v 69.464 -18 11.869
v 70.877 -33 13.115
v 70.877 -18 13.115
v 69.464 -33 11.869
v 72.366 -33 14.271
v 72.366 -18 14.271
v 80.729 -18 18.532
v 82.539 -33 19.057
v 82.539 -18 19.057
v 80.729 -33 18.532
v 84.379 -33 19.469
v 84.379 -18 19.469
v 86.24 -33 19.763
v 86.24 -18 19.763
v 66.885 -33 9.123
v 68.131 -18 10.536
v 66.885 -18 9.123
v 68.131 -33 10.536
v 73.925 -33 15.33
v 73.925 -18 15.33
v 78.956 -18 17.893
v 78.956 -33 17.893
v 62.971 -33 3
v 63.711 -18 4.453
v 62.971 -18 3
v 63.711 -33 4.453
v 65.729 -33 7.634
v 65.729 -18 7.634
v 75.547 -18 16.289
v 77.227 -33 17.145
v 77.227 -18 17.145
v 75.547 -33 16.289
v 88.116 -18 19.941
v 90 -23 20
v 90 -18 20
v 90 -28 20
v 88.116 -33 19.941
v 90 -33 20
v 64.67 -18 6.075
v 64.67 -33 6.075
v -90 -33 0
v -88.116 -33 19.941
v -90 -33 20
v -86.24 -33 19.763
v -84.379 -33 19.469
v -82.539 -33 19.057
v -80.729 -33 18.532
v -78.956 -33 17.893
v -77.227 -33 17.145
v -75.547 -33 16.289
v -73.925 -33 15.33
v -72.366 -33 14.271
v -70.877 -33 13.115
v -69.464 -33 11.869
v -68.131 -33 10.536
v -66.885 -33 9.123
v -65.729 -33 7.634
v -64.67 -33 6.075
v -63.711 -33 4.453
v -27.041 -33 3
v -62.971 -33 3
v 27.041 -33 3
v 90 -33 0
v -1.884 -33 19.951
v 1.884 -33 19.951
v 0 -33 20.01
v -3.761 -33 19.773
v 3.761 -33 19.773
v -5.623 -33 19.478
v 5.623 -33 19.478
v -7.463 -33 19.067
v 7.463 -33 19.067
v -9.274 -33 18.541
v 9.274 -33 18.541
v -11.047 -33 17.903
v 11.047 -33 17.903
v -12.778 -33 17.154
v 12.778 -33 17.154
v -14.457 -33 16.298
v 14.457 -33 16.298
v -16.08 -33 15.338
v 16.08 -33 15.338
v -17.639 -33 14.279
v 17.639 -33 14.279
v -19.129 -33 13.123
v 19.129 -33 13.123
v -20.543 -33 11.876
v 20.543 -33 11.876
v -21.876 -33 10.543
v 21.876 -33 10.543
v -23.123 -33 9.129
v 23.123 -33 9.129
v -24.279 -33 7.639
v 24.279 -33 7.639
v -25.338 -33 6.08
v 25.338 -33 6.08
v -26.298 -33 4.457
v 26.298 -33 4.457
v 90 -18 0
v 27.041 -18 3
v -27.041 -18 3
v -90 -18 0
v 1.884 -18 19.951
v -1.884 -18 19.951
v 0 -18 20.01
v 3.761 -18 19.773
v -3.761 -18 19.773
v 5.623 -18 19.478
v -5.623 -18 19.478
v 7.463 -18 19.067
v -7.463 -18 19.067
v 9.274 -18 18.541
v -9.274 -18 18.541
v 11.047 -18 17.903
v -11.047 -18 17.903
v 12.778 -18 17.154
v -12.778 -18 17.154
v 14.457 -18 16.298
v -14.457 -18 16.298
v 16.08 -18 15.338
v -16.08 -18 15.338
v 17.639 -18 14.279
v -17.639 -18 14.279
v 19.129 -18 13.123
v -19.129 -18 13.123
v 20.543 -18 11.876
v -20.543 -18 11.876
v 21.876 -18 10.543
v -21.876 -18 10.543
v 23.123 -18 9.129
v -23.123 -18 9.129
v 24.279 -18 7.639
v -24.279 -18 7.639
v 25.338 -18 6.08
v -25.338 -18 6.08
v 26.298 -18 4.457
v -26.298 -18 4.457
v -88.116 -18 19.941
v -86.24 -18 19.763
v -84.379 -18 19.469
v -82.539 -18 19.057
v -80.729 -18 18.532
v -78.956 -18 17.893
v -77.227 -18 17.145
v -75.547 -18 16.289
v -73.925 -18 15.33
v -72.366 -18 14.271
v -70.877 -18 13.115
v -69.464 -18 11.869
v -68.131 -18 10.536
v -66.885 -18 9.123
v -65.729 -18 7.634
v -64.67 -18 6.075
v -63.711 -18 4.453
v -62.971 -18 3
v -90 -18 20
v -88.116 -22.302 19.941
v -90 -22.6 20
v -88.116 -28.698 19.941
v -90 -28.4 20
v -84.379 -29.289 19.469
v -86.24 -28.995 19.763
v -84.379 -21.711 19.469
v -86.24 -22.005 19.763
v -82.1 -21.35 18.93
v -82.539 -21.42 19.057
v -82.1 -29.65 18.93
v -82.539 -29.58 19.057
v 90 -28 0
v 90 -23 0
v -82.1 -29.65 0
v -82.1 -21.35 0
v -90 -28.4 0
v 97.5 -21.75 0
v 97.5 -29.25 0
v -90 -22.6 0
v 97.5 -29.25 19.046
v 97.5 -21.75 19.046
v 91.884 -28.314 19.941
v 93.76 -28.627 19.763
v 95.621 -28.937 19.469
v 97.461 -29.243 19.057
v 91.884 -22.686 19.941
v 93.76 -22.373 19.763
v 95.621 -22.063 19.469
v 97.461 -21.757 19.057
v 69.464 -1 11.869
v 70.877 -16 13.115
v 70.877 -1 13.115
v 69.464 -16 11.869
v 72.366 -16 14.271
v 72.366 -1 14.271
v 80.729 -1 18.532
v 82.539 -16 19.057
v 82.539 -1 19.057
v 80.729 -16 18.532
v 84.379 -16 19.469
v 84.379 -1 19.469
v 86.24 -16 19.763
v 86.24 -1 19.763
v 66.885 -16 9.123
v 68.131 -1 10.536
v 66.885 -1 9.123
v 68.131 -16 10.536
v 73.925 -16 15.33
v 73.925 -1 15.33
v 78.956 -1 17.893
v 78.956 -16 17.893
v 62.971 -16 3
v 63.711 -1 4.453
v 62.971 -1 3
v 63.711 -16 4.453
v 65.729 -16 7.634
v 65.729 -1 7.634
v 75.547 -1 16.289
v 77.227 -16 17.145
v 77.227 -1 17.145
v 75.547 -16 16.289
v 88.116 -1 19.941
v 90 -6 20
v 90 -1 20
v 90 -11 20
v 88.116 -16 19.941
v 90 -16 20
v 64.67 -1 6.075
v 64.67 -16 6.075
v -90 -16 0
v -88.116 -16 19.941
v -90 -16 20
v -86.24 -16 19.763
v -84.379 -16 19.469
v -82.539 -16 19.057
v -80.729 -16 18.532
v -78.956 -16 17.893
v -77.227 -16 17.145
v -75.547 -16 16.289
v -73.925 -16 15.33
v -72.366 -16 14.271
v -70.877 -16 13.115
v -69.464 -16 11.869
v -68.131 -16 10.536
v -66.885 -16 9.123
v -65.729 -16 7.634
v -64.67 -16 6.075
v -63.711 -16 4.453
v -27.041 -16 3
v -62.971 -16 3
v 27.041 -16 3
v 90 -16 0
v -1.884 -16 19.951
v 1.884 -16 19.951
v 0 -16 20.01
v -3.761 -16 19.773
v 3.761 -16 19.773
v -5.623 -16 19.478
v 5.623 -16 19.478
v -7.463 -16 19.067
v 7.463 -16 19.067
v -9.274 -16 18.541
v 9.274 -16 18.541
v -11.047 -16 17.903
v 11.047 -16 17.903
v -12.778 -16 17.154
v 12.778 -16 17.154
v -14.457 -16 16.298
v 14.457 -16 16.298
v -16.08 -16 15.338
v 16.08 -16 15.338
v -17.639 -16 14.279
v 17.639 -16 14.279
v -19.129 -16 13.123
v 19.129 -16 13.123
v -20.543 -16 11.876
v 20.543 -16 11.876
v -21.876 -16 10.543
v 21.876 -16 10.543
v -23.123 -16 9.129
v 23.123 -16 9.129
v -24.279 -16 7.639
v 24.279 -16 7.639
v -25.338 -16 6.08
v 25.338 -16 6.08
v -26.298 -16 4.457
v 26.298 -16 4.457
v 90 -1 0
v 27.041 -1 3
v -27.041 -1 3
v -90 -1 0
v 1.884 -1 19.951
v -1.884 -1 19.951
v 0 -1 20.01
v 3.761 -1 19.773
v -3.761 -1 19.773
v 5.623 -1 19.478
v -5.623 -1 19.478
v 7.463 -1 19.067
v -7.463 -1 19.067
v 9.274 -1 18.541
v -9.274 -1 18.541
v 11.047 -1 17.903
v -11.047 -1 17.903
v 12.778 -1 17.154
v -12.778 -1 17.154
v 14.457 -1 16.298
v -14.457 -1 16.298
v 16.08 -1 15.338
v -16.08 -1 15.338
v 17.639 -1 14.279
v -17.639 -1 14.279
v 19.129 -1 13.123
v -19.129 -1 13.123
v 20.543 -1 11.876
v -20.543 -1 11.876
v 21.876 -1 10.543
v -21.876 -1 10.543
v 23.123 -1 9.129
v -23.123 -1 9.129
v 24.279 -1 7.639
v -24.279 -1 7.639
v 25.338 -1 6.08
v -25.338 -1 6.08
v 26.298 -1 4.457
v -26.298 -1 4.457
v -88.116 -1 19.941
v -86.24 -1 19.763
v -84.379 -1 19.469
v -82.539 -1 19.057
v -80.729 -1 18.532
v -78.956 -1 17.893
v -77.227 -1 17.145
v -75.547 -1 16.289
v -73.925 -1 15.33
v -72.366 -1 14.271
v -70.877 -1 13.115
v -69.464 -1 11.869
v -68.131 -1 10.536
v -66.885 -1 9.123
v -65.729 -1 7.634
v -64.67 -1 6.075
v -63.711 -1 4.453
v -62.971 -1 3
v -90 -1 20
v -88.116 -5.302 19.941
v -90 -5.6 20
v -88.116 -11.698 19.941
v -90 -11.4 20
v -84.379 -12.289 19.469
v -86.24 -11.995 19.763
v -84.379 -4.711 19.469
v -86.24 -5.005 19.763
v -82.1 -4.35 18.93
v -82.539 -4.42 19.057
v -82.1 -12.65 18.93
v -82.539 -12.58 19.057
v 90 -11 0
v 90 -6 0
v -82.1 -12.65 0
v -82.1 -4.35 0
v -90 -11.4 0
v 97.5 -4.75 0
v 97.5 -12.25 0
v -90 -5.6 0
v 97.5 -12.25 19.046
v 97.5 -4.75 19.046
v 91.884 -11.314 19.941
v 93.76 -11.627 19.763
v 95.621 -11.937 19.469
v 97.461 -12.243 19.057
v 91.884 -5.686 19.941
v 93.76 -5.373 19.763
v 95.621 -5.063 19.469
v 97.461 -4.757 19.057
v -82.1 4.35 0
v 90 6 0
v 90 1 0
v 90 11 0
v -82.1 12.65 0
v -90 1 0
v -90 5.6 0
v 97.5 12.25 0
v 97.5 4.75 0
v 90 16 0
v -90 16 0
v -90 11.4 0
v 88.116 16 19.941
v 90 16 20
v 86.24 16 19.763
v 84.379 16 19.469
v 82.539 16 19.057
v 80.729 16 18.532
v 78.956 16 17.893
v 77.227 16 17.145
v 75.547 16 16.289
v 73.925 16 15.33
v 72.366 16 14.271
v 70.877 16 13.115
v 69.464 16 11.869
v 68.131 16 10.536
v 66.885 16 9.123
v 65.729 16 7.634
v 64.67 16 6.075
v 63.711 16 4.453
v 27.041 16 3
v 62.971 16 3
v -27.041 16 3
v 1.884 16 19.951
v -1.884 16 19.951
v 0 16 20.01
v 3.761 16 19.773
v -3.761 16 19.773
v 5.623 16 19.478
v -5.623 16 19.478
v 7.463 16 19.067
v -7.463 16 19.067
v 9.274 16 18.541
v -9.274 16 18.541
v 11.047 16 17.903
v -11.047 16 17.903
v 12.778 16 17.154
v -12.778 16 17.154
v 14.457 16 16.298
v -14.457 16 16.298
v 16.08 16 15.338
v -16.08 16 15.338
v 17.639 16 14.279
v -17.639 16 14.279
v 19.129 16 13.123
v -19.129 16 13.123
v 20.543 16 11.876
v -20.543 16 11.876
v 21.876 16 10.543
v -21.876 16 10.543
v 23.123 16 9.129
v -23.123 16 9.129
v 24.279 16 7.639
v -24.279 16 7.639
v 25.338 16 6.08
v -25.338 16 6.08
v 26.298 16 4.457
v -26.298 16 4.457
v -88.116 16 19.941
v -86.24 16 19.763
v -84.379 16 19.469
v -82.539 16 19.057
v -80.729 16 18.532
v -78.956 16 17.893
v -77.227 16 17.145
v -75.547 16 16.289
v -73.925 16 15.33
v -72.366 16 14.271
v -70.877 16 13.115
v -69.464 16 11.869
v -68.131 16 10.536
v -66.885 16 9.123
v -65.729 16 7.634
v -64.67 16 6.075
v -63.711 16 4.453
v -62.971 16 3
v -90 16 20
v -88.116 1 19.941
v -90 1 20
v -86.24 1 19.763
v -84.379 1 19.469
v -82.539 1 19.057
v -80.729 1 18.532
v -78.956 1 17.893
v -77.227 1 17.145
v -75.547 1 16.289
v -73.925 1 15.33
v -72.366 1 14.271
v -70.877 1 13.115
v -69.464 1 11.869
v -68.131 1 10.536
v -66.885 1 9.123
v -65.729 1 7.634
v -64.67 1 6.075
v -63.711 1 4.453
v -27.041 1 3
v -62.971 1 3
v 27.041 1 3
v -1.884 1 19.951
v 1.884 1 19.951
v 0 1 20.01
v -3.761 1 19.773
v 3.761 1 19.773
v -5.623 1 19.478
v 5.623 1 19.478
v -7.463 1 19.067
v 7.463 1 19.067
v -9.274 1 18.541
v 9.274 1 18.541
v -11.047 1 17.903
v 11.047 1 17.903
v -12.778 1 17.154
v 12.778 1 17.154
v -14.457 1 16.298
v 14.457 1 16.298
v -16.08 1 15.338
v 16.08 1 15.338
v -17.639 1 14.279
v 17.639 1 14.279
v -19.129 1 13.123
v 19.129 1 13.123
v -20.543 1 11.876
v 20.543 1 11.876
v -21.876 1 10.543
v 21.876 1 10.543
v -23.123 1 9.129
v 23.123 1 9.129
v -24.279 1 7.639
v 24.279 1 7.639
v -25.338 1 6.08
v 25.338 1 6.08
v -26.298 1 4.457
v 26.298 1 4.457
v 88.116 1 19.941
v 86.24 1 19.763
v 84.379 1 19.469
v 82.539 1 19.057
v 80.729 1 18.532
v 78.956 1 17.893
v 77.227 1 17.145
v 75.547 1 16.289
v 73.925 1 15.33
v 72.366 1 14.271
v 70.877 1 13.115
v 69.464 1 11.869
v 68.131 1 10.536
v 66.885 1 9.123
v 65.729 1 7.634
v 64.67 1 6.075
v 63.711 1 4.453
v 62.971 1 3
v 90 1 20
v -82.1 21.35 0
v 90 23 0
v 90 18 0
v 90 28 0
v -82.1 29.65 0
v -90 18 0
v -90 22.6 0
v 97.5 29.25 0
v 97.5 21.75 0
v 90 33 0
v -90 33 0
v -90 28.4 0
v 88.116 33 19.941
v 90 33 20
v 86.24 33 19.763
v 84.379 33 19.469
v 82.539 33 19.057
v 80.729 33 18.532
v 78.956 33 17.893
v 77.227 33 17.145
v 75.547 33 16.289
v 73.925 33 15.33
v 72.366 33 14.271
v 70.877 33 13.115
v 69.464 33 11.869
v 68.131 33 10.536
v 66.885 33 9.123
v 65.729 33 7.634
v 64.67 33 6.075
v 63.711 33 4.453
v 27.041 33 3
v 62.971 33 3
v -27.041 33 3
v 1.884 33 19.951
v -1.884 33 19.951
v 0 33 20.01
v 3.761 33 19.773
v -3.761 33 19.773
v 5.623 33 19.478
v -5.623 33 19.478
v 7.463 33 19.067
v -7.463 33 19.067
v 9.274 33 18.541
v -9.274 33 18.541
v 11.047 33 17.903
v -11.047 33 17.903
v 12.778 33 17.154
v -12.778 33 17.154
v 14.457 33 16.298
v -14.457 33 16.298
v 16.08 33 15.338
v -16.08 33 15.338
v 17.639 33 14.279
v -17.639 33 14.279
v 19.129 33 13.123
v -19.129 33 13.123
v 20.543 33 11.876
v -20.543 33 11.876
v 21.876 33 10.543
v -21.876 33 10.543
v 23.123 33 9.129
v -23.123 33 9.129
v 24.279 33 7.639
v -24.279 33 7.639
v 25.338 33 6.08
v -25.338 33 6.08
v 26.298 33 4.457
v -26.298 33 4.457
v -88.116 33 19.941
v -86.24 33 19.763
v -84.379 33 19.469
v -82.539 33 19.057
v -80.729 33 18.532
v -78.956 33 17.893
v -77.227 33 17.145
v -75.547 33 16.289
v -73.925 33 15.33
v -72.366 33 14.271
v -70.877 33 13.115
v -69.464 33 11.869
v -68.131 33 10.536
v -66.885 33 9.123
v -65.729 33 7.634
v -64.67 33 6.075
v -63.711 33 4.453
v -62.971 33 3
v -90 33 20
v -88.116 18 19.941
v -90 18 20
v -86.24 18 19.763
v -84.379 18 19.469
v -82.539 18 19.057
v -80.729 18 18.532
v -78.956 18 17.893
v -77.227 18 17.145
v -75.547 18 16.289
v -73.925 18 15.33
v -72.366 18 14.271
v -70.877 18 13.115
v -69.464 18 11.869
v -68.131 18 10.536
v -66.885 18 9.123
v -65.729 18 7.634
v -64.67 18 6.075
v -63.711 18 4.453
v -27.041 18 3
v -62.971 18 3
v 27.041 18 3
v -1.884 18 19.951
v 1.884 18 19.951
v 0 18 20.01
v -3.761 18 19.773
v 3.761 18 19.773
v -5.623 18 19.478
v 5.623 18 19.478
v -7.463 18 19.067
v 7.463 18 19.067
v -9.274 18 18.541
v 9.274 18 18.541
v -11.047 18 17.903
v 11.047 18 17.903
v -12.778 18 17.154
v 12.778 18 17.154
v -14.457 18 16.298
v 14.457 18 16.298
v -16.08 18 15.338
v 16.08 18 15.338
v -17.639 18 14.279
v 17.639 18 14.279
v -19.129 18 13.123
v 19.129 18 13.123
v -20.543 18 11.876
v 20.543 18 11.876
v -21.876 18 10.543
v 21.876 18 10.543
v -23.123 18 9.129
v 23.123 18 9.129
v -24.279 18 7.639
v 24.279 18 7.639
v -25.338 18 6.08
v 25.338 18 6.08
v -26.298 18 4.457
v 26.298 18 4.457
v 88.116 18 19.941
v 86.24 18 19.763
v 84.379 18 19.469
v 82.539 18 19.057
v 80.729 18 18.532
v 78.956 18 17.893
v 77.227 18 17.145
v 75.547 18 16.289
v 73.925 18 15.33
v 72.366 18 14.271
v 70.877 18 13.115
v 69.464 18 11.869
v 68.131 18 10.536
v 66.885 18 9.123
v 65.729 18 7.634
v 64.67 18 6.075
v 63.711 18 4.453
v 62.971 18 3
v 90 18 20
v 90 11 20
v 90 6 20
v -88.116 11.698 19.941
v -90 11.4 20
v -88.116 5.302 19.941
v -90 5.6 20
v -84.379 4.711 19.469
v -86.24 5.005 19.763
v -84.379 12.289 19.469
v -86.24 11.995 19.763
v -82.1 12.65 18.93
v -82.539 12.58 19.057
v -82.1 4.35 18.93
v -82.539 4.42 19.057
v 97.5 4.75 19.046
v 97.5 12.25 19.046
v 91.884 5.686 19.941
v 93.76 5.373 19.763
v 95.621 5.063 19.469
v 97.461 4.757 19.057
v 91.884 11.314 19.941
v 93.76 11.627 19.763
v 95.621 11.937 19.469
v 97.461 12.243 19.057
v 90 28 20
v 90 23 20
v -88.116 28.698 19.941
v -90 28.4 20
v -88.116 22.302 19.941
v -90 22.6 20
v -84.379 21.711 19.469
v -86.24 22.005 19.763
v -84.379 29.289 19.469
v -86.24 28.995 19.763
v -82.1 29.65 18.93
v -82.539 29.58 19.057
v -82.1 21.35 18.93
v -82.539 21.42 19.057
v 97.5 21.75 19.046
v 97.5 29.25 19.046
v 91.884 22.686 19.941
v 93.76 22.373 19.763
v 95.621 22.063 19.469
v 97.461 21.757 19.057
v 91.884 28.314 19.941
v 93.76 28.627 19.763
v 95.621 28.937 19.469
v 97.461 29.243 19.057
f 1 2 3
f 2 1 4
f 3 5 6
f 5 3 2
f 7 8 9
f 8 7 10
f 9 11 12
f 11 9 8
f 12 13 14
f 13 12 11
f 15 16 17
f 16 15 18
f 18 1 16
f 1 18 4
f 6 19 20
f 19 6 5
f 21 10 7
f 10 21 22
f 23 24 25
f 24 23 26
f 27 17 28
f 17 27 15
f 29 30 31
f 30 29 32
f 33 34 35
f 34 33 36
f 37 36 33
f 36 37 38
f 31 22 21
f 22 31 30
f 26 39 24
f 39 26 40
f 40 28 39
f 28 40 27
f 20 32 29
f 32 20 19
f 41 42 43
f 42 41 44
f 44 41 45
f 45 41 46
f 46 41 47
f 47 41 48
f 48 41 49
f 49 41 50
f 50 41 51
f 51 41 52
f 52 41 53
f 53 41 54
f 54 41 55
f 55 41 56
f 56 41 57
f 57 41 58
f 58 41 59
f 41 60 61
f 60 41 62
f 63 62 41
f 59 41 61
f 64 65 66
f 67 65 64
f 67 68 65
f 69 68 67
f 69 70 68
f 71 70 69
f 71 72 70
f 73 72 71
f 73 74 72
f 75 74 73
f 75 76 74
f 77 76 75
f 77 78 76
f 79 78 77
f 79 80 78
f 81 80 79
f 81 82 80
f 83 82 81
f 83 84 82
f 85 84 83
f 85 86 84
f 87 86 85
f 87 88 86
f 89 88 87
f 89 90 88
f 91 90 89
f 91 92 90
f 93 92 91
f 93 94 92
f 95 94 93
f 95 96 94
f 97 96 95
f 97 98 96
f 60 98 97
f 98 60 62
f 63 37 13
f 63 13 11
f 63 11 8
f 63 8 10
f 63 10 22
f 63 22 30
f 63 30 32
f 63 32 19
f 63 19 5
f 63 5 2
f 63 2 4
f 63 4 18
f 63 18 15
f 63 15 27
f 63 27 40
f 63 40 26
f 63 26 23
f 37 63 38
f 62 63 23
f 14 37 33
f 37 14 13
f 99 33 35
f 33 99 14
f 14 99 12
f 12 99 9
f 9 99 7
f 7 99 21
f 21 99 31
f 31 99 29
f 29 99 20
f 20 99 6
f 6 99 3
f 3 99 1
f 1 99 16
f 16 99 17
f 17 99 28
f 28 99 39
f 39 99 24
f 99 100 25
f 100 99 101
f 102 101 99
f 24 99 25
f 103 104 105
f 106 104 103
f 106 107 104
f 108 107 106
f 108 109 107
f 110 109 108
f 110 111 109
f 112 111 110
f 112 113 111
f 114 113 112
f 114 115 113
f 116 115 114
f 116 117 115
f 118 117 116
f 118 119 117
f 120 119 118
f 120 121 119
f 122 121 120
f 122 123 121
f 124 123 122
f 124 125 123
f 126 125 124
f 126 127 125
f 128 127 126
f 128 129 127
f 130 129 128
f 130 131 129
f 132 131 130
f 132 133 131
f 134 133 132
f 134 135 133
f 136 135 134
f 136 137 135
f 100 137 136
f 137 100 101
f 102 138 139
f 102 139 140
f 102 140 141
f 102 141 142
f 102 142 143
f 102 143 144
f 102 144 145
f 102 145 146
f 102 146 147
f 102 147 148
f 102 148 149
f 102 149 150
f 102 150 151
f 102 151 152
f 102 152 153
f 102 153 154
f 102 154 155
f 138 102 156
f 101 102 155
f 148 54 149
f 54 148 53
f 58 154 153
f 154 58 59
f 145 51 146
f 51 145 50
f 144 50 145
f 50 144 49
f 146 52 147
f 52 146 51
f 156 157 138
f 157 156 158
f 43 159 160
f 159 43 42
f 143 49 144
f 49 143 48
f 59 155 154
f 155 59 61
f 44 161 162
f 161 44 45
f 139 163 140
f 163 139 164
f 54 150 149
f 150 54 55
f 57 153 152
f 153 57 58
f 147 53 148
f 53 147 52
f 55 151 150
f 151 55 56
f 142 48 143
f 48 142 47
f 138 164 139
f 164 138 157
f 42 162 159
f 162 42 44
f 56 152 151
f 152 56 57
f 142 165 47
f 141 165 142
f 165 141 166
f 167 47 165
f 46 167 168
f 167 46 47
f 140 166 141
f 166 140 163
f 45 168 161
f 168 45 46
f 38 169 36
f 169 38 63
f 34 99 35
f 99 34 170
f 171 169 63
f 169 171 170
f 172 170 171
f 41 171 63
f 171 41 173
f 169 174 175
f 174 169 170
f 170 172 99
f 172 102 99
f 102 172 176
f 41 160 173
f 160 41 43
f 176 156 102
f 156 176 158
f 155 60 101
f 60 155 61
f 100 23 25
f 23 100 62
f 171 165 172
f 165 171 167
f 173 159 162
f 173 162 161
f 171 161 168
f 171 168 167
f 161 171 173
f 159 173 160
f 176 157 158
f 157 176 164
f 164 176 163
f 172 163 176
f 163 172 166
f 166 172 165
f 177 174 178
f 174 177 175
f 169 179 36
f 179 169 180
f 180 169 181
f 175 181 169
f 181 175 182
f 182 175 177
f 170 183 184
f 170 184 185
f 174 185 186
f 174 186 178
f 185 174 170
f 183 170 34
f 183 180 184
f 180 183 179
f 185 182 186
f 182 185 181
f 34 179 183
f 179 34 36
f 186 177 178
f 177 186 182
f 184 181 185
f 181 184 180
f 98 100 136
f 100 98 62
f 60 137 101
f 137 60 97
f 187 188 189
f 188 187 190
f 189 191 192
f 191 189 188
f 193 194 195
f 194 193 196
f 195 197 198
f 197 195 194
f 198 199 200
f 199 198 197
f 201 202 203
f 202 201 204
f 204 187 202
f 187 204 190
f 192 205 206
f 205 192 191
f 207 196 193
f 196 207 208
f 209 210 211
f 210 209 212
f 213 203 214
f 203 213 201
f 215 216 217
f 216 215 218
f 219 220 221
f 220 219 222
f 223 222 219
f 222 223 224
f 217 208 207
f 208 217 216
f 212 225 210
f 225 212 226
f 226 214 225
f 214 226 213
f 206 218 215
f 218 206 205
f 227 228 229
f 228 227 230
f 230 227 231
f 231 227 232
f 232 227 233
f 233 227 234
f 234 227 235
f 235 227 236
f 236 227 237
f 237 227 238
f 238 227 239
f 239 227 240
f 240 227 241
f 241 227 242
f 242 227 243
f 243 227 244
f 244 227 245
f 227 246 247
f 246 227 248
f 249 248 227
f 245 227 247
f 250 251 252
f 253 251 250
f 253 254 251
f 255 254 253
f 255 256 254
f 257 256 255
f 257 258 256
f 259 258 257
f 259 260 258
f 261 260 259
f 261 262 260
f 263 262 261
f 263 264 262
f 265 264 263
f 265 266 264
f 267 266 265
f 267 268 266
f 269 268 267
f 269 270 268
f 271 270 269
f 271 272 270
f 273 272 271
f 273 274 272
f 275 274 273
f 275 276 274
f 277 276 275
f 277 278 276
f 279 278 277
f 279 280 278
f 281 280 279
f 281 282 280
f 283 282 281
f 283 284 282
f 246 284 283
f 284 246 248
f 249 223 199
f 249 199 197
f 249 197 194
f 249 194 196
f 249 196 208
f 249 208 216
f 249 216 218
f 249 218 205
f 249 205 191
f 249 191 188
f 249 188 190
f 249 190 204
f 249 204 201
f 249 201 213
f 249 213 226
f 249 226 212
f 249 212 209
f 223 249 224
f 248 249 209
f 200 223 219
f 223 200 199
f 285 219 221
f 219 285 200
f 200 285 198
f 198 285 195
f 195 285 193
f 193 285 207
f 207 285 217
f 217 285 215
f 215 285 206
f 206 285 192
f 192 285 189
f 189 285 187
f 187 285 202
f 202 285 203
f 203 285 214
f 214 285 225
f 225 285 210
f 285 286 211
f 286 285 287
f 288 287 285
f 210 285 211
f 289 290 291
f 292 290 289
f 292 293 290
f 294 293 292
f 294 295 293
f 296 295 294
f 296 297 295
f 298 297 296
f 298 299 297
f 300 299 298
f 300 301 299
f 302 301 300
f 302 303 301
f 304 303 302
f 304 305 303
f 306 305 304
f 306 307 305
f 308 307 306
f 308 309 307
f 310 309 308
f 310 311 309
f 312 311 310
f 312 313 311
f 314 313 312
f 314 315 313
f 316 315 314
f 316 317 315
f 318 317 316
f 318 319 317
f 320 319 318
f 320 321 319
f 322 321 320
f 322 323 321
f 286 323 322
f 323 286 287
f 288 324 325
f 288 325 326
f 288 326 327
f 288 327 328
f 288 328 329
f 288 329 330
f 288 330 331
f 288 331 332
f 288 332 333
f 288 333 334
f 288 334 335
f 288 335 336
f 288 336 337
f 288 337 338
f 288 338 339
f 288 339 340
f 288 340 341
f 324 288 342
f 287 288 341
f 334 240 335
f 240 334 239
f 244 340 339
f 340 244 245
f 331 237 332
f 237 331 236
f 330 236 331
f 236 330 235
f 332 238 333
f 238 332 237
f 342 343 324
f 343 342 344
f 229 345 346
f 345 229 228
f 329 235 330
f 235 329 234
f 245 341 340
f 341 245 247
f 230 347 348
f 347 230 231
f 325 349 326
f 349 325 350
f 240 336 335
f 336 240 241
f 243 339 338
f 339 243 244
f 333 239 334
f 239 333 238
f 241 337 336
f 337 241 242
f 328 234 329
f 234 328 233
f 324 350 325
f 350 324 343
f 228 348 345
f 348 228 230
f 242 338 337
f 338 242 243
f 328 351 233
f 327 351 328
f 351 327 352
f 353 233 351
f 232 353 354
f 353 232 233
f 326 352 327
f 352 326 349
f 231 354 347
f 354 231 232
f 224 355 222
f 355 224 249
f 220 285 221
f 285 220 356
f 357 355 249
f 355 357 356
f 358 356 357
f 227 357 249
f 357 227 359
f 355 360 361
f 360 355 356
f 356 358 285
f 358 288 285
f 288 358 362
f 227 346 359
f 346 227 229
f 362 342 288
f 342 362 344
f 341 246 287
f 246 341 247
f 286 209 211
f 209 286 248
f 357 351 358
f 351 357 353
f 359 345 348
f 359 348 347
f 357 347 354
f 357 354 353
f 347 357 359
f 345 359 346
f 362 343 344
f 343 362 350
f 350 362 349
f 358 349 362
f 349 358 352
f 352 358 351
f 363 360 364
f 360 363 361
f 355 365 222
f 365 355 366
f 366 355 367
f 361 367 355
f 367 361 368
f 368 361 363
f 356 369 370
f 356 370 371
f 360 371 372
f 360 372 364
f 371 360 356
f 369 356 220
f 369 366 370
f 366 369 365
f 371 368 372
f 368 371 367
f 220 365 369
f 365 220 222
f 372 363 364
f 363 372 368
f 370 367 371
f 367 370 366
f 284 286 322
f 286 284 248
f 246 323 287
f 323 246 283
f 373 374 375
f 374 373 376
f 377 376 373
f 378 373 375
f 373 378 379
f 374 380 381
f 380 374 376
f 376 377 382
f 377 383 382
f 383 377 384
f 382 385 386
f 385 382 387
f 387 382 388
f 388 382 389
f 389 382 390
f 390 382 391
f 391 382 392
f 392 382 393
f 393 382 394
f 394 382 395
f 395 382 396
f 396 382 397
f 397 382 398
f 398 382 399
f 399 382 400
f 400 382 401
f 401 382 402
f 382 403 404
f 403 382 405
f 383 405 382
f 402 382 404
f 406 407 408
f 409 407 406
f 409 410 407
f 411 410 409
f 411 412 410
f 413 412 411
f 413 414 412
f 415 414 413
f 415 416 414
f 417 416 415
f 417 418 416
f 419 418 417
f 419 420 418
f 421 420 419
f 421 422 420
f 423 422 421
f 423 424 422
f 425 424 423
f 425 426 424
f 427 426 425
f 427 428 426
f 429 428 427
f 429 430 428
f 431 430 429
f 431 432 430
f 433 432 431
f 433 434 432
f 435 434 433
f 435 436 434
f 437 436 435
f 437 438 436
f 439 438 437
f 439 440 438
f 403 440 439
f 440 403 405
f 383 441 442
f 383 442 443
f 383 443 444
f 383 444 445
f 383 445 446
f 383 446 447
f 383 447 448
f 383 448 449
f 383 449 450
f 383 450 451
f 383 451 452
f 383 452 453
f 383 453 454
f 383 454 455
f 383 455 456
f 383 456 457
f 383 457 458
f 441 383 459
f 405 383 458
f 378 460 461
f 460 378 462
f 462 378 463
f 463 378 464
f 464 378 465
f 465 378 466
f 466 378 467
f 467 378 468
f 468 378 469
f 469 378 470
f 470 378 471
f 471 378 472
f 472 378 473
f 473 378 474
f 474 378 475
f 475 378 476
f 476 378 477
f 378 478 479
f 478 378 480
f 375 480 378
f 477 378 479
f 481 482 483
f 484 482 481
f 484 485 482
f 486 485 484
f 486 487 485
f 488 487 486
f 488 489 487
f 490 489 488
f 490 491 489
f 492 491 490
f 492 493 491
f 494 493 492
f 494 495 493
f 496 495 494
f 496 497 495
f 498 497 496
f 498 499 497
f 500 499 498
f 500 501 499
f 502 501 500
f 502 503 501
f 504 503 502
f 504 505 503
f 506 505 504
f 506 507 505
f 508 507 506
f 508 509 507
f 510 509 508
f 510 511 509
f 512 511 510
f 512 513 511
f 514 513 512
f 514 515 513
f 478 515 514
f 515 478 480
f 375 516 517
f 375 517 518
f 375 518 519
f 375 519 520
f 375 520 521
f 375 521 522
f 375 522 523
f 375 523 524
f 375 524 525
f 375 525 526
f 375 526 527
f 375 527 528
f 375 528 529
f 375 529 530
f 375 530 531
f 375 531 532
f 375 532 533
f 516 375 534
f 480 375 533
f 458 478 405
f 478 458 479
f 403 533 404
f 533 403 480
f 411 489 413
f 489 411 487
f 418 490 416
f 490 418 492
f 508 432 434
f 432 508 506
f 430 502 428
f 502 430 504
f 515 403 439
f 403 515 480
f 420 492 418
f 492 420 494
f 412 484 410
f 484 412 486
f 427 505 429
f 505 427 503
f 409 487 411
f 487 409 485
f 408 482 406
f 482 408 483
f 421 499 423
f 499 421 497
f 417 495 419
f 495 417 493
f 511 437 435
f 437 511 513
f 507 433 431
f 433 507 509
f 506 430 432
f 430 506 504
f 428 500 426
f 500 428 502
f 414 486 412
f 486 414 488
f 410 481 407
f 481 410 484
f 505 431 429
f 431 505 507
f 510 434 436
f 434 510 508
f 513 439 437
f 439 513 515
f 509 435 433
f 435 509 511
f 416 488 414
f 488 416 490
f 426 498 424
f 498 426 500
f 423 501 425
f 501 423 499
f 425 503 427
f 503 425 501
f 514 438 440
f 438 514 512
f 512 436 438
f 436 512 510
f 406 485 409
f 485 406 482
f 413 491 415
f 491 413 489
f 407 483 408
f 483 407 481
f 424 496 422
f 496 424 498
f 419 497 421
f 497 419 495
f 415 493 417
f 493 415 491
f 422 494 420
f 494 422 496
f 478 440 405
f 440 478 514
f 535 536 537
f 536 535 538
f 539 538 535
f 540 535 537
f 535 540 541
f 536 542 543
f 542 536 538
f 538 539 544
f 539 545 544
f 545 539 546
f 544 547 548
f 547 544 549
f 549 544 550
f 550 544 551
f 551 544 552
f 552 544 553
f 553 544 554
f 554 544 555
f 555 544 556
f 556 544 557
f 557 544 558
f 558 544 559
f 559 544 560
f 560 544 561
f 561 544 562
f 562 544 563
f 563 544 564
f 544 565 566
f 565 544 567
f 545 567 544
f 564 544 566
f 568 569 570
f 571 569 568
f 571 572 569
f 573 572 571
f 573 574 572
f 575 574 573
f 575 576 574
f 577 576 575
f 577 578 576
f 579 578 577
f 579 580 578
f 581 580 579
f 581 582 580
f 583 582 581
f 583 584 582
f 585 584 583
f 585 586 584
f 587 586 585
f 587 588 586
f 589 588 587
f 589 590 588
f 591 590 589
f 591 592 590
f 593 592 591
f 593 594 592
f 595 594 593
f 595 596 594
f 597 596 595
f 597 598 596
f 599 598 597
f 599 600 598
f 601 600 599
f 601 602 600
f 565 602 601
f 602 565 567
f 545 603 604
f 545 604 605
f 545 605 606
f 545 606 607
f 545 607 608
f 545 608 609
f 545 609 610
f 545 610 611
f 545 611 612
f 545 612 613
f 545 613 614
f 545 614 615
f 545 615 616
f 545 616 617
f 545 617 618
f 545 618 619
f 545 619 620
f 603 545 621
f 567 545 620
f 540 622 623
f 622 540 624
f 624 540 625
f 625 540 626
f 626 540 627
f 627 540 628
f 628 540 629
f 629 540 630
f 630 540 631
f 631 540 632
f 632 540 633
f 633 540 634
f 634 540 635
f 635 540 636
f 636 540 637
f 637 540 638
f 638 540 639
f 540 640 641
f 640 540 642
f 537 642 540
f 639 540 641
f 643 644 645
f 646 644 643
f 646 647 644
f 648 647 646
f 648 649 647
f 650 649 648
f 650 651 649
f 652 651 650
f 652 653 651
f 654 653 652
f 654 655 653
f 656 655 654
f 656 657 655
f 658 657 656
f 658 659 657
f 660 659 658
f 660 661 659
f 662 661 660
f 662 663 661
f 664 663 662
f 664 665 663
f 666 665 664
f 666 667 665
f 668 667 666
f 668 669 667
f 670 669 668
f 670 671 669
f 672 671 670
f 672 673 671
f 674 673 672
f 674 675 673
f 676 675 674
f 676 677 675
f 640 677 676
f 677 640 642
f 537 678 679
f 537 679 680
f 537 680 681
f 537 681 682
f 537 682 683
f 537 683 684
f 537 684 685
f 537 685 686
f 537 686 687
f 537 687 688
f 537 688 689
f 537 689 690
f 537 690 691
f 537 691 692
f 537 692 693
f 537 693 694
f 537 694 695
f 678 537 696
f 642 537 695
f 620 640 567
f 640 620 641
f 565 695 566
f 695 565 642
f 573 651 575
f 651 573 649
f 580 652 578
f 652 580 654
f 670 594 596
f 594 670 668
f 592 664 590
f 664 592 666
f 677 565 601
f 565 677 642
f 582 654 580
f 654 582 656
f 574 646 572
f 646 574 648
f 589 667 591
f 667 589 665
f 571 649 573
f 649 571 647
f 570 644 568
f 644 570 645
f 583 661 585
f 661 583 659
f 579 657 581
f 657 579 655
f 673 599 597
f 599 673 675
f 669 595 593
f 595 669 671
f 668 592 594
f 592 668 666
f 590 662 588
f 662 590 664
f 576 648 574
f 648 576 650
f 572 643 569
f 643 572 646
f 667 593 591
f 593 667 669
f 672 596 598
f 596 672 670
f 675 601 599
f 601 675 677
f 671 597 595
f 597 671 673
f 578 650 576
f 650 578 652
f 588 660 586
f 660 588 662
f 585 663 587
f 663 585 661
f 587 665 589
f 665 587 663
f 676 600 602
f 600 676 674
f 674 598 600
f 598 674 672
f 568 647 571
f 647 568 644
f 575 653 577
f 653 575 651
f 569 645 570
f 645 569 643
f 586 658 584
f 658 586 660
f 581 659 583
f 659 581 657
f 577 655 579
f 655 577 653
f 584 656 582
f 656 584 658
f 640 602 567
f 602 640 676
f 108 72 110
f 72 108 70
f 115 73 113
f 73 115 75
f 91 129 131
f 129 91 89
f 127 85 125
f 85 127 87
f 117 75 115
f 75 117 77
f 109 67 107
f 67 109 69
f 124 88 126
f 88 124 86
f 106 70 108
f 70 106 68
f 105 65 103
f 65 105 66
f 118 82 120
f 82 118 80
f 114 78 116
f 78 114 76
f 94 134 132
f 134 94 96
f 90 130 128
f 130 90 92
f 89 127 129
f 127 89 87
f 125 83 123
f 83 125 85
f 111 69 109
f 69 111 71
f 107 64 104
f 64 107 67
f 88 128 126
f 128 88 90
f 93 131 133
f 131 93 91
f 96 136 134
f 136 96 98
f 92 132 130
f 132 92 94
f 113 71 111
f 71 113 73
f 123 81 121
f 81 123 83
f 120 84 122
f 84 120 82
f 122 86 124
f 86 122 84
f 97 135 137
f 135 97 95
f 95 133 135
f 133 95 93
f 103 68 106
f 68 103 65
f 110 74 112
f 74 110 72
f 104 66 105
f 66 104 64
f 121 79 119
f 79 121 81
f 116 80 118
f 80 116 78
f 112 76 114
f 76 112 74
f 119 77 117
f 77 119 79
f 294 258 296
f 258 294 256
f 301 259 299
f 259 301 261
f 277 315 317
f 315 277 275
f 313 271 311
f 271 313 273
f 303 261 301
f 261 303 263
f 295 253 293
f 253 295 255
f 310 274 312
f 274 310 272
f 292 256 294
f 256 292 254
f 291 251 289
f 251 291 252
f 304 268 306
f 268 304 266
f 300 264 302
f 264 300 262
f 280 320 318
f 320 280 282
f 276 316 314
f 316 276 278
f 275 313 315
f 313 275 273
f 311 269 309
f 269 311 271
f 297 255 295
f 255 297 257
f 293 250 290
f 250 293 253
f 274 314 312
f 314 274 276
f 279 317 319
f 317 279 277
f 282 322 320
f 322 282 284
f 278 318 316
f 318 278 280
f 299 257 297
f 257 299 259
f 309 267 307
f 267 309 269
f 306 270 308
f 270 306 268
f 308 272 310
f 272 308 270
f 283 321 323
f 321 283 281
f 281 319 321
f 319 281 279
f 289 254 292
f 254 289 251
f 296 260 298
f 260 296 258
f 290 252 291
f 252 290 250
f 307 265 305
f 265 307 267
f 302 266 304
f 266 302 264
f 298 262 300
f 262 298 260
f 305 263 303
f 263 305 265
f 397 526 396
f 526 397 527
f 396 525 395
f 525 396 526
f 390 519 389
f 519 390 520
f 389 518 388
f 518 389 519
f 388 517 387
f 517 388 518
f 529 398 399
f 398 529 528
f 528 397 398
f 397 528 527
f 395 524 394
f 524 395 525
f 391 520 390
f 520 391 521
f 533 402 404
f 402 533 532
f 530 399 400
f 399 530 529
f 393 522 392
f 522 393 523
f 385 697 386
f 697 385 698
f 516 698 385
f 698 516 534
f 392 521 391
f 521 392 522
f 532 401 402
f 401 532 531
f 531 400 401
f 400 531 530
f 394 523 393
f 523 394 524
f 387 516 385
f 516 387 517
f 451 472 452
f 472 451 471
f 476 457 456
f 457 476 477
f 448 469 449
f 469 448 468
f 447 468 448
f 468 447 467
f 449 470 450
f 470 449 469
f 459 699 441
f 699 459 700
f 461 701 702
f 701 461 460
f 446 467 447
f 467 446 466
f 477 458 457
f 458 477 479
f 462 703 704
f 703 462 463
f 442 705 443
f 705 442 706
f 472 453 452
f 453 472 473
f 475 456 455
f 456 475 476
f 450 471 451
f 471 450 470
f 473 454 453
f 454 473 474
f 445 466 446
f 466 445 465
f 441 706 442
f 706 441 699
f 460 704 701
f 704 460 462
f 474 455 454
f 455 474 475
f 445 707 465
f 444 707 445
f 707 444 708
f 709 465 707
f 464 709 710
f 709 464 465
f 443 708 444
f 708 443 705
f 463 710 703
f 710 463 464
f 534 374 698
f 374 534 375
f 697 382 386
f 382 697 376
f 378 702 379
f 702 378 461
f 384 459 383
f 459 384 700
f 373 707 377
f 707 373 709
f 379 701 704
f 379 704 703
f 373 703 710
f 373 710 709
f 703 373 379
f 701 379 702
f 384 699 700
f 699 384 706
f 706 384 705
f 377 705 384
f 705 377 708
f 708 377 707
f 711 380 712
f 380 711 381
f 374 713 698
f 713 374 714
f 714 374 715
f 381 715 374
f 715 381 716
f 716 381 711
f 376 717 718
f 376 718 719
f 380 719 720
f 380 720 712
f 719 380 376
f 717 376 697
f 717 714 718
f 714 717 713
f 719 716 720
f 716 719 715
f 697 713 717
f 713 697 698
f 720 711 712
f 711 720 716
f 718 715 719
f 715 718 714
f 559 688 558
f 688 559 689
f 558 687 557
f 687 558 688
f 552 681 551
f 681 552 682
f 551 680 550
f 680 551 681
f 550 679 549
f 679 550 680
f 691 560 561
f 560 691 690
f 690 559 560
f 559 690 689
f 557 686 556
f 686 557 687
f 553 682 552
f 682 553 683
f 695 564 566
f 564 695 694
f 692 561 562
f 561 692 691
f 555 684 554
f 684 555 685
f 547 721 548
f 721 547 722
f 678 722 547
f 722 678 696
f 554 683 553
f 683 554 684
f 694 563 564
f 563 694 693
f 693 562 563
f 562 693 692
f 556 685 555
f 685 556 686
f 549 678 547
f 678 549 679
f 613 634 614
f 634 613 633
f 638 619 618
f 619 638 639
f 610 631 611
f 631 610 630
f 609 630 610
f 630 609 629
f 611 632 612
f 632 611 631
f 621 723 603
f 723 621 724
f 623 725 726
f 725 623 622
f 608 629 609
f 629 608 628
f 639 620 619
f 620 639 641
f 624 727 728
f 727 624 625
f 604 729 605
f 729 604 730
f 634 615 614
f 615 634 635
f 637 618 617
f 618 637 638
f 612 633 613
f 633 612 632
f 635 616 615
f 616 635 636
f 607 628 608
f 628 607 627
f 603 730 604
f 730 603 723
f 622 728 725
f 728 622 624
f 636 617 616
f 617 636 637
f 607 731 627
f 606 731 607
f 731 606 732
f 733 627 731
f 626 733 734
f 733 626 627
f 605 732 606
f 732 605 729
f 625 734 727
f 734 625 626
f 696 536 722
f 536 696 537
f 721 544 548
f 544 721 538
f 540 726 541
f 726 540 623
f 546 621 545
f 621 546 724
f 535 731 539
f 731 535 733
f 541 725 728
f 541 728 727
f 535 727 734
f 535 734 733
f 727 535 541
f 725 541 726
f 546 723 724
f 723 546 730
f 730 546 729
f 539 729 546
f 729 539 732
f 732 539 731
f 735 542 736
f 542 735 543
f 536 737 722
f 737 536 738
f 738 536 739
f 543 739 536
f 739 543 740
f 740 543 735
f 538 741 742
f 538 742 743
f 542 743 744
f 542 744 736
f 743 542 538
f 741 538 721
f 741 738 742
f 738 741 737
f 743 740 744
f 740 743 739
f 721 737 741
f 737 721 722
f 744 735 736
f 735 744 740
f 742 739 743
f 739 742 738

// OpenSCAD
//*********User Defined variables****************

//How many pairs of strips do you want to print?
pairs=2;

//What's the primary color?
primary_color="white"; //[black,silver,gray,white,maroon,red,purple,fuchsia,green,lime,olive,yellow,navy,blue,teal,aqua]

//What's the secondary color?
secondary_color="red"; //[black,silver,gray,white,maroon,red,purple,fuchsia,green,lime,olive,yellow,navy,blue,teal,aqua]

//This design will output 3 files - one for printing in a solid color and 2 for printing using dualstrusion.
part = "Solid"; //[Solid,Dual1,Dual2]

//If you're dualstruding, do you want all strips the same or do you want half with the colors reversed?
dualstrusion_mix = "mixed"; //[all the same,mixed]

//About how wide should each bottle space be? 90mm works well for wine bottles.
bottle_space_width=90;

//How deep should the strips be?  15 mm works well for wine bottles.
strip_depth=15;

//How thick should the strips be?
strip_thickness=3;

//How far apart do you want the strips spaced on the build platform?
spacing = 2;

//What tolerance should be used for the dovetail joints?
tolerance=.4;


//*****Dimensional Parameters*****
//*****These are currently set for standard wine bottles****
length = bottle_space_width; //This is really half the overall length, so final length = length*2
depth = strip_depth; //depth of the strip
base_thick = strip_thickness; //thickness of the base
bump = 1/3*bottle_space_width; // radius of the circles that form the bumps in the strip
clearance = 2/3*bump; //height above the base that the bumps will protrude
res=100*1; //resolution for rendering of circles
tol=tolerance;


//**********Calculated Variables*****
count=pairs*2;


//**********Generate parts***********


//*******first color**********//
if(part=="Dual1" || part=="Solid")color(primary_color){
	//***********all parts dualstruded*******//
	if(dualstrusion_mix=="all the same"){
		for(i=[0:count-1]){
			translate([0,(-(count-1)*(depth+spacing))/2+i*(depth+spacing),0]){
				difference(){
					strip();
					center_void();
				}
			}
		}
	}
	//***********half parts dualstruded normally, half colors reversed*****//
	if(dualstrusion_mix=="mixed"){
		for(i=[0:pairs-1]){
			translate([0,(-(count-1)*(depth+spacing))/2+i*(depth+spacing),0]){
				difference(){
					strip();
					center_void();
				}
			}
		}
		for(i=[pairs:count-1]){
			translate([0,(-(count-1)*(depth+spacing))/2+i*(depth+spacing),0]){
				center();
			}
		}
	}
}

//////////*********Second color for dualstrusion*****
if(part=="Dual2" || part=="Solid")color(secondary_color){
	//***********all parts dualstruded*******//
	if(dualstrusion_mix=="all the same"){
		for(i=[0:count-1]){
			translate([0,(-(count-1)*(depth+spacing))/2+i*(depth+spacing),0]){
				center();
			}
		}
	}
	//***********half parts dualstruded normally, half colors reversed*****//
	if(dualstrusion_mix=="mixed"){
		for(i=[0:pairs-1]){
			translate([0,(-(count-1)*(depth+spacing))/2+i*(depth+spacing),0]){
				center();
			}
		}
		for(i=[pairs:count-1]){
			translate([0,(-(count-1)*(depth+spacing))/2+i*(depth+spacing),0]){
				difference(){
					strip();
					center_void();
				}
			}
		}
	}
}



//**********************************************
/////////////////Define main component//////////
//**********************************************

module strip(){

	difference(){
	
	union(){
	
		translate([0,0,base_thick/2])cube([2*length,depth,base_thick], center=true);
		
			intersection(){
			
				union(){
					translate([length,0,-bump+clearance])rotate([90,0,0])cylinder(h=depth,r=bump,center=true,$fn=res);
					translate([0,0,-bump+clearance])rotate([90,0,0])cylinder(h=depth,r=bump,center=true,$fn=res);
					translate([-length,0,-bump+clearance])rotate([90,0,0])cylinder(h=depth,r=bump,center=true,$fn=res);
				}
			
				translate([0,0,bump])cube([2*length,depth,2*bump],center=true);
		}
	}
	
	translate([-length,0,0])linear_extrude(height = bump)polygon([[0,1/6*depth+tol],[1/2*depth+tol,1/4*depth+tol],[1/2*depth+tol,-1/4*depth-tol],[0,-1/6*depth-tol]],[[0,1,2,3]]);
	
	}
	
	
	
	intersection(){
		translate([length,0,0])linear_extrude(height = bump)polygon([[0,1/6*depth],[1/2*depth,1/4*depth],[1/2*depth,-1/4*depth],[0,-1/6*depth]],[[0,1,2,3]]);
		translate([length,0,-bump+clearance])rotate([90,0,0])cylinder(h=depth,r=bump,center=true,$fn=res);
	}
}




//**************************************************************************
/////////////////Define void on main piece for dualstrusion//////////
////////////////Slightly thicker than center piece to eliminate "plane" of polygons////
//**************************************************************************

module center_void(){
		
	intersection(){

		translate([0,0,-bump+clearance])rotate([90,0,0])cylinder(h=depth+spacing/4,r=bump+.01,center=true,$fn=res);
	
		difference(){
			translate([0,0,0])cube([2*length,depth+spacing/4,2*bump],center=true);
			translate([0,0,0])cube([2*length,depth/3,2*base_thick],center=true);
		}
	}
}




//**************************************************************************
/////////////////Define second color center piece for dualstrusion//////////
//**************************************************************************

module center(){
		
	intersection(){

		translate([0,0,-bump+clearance])rotate([90,0,0])cylinder(h=depth,r=bump+.01,center=true,$fn=res);
	
		difference(){
			translate([0,0,bump])cube([2*length,depth,2*bump],center=true);
			translate([0,0,base_thick/2])cube([2*length,depth/3,base_thick],center=true);
		}
	}
}
